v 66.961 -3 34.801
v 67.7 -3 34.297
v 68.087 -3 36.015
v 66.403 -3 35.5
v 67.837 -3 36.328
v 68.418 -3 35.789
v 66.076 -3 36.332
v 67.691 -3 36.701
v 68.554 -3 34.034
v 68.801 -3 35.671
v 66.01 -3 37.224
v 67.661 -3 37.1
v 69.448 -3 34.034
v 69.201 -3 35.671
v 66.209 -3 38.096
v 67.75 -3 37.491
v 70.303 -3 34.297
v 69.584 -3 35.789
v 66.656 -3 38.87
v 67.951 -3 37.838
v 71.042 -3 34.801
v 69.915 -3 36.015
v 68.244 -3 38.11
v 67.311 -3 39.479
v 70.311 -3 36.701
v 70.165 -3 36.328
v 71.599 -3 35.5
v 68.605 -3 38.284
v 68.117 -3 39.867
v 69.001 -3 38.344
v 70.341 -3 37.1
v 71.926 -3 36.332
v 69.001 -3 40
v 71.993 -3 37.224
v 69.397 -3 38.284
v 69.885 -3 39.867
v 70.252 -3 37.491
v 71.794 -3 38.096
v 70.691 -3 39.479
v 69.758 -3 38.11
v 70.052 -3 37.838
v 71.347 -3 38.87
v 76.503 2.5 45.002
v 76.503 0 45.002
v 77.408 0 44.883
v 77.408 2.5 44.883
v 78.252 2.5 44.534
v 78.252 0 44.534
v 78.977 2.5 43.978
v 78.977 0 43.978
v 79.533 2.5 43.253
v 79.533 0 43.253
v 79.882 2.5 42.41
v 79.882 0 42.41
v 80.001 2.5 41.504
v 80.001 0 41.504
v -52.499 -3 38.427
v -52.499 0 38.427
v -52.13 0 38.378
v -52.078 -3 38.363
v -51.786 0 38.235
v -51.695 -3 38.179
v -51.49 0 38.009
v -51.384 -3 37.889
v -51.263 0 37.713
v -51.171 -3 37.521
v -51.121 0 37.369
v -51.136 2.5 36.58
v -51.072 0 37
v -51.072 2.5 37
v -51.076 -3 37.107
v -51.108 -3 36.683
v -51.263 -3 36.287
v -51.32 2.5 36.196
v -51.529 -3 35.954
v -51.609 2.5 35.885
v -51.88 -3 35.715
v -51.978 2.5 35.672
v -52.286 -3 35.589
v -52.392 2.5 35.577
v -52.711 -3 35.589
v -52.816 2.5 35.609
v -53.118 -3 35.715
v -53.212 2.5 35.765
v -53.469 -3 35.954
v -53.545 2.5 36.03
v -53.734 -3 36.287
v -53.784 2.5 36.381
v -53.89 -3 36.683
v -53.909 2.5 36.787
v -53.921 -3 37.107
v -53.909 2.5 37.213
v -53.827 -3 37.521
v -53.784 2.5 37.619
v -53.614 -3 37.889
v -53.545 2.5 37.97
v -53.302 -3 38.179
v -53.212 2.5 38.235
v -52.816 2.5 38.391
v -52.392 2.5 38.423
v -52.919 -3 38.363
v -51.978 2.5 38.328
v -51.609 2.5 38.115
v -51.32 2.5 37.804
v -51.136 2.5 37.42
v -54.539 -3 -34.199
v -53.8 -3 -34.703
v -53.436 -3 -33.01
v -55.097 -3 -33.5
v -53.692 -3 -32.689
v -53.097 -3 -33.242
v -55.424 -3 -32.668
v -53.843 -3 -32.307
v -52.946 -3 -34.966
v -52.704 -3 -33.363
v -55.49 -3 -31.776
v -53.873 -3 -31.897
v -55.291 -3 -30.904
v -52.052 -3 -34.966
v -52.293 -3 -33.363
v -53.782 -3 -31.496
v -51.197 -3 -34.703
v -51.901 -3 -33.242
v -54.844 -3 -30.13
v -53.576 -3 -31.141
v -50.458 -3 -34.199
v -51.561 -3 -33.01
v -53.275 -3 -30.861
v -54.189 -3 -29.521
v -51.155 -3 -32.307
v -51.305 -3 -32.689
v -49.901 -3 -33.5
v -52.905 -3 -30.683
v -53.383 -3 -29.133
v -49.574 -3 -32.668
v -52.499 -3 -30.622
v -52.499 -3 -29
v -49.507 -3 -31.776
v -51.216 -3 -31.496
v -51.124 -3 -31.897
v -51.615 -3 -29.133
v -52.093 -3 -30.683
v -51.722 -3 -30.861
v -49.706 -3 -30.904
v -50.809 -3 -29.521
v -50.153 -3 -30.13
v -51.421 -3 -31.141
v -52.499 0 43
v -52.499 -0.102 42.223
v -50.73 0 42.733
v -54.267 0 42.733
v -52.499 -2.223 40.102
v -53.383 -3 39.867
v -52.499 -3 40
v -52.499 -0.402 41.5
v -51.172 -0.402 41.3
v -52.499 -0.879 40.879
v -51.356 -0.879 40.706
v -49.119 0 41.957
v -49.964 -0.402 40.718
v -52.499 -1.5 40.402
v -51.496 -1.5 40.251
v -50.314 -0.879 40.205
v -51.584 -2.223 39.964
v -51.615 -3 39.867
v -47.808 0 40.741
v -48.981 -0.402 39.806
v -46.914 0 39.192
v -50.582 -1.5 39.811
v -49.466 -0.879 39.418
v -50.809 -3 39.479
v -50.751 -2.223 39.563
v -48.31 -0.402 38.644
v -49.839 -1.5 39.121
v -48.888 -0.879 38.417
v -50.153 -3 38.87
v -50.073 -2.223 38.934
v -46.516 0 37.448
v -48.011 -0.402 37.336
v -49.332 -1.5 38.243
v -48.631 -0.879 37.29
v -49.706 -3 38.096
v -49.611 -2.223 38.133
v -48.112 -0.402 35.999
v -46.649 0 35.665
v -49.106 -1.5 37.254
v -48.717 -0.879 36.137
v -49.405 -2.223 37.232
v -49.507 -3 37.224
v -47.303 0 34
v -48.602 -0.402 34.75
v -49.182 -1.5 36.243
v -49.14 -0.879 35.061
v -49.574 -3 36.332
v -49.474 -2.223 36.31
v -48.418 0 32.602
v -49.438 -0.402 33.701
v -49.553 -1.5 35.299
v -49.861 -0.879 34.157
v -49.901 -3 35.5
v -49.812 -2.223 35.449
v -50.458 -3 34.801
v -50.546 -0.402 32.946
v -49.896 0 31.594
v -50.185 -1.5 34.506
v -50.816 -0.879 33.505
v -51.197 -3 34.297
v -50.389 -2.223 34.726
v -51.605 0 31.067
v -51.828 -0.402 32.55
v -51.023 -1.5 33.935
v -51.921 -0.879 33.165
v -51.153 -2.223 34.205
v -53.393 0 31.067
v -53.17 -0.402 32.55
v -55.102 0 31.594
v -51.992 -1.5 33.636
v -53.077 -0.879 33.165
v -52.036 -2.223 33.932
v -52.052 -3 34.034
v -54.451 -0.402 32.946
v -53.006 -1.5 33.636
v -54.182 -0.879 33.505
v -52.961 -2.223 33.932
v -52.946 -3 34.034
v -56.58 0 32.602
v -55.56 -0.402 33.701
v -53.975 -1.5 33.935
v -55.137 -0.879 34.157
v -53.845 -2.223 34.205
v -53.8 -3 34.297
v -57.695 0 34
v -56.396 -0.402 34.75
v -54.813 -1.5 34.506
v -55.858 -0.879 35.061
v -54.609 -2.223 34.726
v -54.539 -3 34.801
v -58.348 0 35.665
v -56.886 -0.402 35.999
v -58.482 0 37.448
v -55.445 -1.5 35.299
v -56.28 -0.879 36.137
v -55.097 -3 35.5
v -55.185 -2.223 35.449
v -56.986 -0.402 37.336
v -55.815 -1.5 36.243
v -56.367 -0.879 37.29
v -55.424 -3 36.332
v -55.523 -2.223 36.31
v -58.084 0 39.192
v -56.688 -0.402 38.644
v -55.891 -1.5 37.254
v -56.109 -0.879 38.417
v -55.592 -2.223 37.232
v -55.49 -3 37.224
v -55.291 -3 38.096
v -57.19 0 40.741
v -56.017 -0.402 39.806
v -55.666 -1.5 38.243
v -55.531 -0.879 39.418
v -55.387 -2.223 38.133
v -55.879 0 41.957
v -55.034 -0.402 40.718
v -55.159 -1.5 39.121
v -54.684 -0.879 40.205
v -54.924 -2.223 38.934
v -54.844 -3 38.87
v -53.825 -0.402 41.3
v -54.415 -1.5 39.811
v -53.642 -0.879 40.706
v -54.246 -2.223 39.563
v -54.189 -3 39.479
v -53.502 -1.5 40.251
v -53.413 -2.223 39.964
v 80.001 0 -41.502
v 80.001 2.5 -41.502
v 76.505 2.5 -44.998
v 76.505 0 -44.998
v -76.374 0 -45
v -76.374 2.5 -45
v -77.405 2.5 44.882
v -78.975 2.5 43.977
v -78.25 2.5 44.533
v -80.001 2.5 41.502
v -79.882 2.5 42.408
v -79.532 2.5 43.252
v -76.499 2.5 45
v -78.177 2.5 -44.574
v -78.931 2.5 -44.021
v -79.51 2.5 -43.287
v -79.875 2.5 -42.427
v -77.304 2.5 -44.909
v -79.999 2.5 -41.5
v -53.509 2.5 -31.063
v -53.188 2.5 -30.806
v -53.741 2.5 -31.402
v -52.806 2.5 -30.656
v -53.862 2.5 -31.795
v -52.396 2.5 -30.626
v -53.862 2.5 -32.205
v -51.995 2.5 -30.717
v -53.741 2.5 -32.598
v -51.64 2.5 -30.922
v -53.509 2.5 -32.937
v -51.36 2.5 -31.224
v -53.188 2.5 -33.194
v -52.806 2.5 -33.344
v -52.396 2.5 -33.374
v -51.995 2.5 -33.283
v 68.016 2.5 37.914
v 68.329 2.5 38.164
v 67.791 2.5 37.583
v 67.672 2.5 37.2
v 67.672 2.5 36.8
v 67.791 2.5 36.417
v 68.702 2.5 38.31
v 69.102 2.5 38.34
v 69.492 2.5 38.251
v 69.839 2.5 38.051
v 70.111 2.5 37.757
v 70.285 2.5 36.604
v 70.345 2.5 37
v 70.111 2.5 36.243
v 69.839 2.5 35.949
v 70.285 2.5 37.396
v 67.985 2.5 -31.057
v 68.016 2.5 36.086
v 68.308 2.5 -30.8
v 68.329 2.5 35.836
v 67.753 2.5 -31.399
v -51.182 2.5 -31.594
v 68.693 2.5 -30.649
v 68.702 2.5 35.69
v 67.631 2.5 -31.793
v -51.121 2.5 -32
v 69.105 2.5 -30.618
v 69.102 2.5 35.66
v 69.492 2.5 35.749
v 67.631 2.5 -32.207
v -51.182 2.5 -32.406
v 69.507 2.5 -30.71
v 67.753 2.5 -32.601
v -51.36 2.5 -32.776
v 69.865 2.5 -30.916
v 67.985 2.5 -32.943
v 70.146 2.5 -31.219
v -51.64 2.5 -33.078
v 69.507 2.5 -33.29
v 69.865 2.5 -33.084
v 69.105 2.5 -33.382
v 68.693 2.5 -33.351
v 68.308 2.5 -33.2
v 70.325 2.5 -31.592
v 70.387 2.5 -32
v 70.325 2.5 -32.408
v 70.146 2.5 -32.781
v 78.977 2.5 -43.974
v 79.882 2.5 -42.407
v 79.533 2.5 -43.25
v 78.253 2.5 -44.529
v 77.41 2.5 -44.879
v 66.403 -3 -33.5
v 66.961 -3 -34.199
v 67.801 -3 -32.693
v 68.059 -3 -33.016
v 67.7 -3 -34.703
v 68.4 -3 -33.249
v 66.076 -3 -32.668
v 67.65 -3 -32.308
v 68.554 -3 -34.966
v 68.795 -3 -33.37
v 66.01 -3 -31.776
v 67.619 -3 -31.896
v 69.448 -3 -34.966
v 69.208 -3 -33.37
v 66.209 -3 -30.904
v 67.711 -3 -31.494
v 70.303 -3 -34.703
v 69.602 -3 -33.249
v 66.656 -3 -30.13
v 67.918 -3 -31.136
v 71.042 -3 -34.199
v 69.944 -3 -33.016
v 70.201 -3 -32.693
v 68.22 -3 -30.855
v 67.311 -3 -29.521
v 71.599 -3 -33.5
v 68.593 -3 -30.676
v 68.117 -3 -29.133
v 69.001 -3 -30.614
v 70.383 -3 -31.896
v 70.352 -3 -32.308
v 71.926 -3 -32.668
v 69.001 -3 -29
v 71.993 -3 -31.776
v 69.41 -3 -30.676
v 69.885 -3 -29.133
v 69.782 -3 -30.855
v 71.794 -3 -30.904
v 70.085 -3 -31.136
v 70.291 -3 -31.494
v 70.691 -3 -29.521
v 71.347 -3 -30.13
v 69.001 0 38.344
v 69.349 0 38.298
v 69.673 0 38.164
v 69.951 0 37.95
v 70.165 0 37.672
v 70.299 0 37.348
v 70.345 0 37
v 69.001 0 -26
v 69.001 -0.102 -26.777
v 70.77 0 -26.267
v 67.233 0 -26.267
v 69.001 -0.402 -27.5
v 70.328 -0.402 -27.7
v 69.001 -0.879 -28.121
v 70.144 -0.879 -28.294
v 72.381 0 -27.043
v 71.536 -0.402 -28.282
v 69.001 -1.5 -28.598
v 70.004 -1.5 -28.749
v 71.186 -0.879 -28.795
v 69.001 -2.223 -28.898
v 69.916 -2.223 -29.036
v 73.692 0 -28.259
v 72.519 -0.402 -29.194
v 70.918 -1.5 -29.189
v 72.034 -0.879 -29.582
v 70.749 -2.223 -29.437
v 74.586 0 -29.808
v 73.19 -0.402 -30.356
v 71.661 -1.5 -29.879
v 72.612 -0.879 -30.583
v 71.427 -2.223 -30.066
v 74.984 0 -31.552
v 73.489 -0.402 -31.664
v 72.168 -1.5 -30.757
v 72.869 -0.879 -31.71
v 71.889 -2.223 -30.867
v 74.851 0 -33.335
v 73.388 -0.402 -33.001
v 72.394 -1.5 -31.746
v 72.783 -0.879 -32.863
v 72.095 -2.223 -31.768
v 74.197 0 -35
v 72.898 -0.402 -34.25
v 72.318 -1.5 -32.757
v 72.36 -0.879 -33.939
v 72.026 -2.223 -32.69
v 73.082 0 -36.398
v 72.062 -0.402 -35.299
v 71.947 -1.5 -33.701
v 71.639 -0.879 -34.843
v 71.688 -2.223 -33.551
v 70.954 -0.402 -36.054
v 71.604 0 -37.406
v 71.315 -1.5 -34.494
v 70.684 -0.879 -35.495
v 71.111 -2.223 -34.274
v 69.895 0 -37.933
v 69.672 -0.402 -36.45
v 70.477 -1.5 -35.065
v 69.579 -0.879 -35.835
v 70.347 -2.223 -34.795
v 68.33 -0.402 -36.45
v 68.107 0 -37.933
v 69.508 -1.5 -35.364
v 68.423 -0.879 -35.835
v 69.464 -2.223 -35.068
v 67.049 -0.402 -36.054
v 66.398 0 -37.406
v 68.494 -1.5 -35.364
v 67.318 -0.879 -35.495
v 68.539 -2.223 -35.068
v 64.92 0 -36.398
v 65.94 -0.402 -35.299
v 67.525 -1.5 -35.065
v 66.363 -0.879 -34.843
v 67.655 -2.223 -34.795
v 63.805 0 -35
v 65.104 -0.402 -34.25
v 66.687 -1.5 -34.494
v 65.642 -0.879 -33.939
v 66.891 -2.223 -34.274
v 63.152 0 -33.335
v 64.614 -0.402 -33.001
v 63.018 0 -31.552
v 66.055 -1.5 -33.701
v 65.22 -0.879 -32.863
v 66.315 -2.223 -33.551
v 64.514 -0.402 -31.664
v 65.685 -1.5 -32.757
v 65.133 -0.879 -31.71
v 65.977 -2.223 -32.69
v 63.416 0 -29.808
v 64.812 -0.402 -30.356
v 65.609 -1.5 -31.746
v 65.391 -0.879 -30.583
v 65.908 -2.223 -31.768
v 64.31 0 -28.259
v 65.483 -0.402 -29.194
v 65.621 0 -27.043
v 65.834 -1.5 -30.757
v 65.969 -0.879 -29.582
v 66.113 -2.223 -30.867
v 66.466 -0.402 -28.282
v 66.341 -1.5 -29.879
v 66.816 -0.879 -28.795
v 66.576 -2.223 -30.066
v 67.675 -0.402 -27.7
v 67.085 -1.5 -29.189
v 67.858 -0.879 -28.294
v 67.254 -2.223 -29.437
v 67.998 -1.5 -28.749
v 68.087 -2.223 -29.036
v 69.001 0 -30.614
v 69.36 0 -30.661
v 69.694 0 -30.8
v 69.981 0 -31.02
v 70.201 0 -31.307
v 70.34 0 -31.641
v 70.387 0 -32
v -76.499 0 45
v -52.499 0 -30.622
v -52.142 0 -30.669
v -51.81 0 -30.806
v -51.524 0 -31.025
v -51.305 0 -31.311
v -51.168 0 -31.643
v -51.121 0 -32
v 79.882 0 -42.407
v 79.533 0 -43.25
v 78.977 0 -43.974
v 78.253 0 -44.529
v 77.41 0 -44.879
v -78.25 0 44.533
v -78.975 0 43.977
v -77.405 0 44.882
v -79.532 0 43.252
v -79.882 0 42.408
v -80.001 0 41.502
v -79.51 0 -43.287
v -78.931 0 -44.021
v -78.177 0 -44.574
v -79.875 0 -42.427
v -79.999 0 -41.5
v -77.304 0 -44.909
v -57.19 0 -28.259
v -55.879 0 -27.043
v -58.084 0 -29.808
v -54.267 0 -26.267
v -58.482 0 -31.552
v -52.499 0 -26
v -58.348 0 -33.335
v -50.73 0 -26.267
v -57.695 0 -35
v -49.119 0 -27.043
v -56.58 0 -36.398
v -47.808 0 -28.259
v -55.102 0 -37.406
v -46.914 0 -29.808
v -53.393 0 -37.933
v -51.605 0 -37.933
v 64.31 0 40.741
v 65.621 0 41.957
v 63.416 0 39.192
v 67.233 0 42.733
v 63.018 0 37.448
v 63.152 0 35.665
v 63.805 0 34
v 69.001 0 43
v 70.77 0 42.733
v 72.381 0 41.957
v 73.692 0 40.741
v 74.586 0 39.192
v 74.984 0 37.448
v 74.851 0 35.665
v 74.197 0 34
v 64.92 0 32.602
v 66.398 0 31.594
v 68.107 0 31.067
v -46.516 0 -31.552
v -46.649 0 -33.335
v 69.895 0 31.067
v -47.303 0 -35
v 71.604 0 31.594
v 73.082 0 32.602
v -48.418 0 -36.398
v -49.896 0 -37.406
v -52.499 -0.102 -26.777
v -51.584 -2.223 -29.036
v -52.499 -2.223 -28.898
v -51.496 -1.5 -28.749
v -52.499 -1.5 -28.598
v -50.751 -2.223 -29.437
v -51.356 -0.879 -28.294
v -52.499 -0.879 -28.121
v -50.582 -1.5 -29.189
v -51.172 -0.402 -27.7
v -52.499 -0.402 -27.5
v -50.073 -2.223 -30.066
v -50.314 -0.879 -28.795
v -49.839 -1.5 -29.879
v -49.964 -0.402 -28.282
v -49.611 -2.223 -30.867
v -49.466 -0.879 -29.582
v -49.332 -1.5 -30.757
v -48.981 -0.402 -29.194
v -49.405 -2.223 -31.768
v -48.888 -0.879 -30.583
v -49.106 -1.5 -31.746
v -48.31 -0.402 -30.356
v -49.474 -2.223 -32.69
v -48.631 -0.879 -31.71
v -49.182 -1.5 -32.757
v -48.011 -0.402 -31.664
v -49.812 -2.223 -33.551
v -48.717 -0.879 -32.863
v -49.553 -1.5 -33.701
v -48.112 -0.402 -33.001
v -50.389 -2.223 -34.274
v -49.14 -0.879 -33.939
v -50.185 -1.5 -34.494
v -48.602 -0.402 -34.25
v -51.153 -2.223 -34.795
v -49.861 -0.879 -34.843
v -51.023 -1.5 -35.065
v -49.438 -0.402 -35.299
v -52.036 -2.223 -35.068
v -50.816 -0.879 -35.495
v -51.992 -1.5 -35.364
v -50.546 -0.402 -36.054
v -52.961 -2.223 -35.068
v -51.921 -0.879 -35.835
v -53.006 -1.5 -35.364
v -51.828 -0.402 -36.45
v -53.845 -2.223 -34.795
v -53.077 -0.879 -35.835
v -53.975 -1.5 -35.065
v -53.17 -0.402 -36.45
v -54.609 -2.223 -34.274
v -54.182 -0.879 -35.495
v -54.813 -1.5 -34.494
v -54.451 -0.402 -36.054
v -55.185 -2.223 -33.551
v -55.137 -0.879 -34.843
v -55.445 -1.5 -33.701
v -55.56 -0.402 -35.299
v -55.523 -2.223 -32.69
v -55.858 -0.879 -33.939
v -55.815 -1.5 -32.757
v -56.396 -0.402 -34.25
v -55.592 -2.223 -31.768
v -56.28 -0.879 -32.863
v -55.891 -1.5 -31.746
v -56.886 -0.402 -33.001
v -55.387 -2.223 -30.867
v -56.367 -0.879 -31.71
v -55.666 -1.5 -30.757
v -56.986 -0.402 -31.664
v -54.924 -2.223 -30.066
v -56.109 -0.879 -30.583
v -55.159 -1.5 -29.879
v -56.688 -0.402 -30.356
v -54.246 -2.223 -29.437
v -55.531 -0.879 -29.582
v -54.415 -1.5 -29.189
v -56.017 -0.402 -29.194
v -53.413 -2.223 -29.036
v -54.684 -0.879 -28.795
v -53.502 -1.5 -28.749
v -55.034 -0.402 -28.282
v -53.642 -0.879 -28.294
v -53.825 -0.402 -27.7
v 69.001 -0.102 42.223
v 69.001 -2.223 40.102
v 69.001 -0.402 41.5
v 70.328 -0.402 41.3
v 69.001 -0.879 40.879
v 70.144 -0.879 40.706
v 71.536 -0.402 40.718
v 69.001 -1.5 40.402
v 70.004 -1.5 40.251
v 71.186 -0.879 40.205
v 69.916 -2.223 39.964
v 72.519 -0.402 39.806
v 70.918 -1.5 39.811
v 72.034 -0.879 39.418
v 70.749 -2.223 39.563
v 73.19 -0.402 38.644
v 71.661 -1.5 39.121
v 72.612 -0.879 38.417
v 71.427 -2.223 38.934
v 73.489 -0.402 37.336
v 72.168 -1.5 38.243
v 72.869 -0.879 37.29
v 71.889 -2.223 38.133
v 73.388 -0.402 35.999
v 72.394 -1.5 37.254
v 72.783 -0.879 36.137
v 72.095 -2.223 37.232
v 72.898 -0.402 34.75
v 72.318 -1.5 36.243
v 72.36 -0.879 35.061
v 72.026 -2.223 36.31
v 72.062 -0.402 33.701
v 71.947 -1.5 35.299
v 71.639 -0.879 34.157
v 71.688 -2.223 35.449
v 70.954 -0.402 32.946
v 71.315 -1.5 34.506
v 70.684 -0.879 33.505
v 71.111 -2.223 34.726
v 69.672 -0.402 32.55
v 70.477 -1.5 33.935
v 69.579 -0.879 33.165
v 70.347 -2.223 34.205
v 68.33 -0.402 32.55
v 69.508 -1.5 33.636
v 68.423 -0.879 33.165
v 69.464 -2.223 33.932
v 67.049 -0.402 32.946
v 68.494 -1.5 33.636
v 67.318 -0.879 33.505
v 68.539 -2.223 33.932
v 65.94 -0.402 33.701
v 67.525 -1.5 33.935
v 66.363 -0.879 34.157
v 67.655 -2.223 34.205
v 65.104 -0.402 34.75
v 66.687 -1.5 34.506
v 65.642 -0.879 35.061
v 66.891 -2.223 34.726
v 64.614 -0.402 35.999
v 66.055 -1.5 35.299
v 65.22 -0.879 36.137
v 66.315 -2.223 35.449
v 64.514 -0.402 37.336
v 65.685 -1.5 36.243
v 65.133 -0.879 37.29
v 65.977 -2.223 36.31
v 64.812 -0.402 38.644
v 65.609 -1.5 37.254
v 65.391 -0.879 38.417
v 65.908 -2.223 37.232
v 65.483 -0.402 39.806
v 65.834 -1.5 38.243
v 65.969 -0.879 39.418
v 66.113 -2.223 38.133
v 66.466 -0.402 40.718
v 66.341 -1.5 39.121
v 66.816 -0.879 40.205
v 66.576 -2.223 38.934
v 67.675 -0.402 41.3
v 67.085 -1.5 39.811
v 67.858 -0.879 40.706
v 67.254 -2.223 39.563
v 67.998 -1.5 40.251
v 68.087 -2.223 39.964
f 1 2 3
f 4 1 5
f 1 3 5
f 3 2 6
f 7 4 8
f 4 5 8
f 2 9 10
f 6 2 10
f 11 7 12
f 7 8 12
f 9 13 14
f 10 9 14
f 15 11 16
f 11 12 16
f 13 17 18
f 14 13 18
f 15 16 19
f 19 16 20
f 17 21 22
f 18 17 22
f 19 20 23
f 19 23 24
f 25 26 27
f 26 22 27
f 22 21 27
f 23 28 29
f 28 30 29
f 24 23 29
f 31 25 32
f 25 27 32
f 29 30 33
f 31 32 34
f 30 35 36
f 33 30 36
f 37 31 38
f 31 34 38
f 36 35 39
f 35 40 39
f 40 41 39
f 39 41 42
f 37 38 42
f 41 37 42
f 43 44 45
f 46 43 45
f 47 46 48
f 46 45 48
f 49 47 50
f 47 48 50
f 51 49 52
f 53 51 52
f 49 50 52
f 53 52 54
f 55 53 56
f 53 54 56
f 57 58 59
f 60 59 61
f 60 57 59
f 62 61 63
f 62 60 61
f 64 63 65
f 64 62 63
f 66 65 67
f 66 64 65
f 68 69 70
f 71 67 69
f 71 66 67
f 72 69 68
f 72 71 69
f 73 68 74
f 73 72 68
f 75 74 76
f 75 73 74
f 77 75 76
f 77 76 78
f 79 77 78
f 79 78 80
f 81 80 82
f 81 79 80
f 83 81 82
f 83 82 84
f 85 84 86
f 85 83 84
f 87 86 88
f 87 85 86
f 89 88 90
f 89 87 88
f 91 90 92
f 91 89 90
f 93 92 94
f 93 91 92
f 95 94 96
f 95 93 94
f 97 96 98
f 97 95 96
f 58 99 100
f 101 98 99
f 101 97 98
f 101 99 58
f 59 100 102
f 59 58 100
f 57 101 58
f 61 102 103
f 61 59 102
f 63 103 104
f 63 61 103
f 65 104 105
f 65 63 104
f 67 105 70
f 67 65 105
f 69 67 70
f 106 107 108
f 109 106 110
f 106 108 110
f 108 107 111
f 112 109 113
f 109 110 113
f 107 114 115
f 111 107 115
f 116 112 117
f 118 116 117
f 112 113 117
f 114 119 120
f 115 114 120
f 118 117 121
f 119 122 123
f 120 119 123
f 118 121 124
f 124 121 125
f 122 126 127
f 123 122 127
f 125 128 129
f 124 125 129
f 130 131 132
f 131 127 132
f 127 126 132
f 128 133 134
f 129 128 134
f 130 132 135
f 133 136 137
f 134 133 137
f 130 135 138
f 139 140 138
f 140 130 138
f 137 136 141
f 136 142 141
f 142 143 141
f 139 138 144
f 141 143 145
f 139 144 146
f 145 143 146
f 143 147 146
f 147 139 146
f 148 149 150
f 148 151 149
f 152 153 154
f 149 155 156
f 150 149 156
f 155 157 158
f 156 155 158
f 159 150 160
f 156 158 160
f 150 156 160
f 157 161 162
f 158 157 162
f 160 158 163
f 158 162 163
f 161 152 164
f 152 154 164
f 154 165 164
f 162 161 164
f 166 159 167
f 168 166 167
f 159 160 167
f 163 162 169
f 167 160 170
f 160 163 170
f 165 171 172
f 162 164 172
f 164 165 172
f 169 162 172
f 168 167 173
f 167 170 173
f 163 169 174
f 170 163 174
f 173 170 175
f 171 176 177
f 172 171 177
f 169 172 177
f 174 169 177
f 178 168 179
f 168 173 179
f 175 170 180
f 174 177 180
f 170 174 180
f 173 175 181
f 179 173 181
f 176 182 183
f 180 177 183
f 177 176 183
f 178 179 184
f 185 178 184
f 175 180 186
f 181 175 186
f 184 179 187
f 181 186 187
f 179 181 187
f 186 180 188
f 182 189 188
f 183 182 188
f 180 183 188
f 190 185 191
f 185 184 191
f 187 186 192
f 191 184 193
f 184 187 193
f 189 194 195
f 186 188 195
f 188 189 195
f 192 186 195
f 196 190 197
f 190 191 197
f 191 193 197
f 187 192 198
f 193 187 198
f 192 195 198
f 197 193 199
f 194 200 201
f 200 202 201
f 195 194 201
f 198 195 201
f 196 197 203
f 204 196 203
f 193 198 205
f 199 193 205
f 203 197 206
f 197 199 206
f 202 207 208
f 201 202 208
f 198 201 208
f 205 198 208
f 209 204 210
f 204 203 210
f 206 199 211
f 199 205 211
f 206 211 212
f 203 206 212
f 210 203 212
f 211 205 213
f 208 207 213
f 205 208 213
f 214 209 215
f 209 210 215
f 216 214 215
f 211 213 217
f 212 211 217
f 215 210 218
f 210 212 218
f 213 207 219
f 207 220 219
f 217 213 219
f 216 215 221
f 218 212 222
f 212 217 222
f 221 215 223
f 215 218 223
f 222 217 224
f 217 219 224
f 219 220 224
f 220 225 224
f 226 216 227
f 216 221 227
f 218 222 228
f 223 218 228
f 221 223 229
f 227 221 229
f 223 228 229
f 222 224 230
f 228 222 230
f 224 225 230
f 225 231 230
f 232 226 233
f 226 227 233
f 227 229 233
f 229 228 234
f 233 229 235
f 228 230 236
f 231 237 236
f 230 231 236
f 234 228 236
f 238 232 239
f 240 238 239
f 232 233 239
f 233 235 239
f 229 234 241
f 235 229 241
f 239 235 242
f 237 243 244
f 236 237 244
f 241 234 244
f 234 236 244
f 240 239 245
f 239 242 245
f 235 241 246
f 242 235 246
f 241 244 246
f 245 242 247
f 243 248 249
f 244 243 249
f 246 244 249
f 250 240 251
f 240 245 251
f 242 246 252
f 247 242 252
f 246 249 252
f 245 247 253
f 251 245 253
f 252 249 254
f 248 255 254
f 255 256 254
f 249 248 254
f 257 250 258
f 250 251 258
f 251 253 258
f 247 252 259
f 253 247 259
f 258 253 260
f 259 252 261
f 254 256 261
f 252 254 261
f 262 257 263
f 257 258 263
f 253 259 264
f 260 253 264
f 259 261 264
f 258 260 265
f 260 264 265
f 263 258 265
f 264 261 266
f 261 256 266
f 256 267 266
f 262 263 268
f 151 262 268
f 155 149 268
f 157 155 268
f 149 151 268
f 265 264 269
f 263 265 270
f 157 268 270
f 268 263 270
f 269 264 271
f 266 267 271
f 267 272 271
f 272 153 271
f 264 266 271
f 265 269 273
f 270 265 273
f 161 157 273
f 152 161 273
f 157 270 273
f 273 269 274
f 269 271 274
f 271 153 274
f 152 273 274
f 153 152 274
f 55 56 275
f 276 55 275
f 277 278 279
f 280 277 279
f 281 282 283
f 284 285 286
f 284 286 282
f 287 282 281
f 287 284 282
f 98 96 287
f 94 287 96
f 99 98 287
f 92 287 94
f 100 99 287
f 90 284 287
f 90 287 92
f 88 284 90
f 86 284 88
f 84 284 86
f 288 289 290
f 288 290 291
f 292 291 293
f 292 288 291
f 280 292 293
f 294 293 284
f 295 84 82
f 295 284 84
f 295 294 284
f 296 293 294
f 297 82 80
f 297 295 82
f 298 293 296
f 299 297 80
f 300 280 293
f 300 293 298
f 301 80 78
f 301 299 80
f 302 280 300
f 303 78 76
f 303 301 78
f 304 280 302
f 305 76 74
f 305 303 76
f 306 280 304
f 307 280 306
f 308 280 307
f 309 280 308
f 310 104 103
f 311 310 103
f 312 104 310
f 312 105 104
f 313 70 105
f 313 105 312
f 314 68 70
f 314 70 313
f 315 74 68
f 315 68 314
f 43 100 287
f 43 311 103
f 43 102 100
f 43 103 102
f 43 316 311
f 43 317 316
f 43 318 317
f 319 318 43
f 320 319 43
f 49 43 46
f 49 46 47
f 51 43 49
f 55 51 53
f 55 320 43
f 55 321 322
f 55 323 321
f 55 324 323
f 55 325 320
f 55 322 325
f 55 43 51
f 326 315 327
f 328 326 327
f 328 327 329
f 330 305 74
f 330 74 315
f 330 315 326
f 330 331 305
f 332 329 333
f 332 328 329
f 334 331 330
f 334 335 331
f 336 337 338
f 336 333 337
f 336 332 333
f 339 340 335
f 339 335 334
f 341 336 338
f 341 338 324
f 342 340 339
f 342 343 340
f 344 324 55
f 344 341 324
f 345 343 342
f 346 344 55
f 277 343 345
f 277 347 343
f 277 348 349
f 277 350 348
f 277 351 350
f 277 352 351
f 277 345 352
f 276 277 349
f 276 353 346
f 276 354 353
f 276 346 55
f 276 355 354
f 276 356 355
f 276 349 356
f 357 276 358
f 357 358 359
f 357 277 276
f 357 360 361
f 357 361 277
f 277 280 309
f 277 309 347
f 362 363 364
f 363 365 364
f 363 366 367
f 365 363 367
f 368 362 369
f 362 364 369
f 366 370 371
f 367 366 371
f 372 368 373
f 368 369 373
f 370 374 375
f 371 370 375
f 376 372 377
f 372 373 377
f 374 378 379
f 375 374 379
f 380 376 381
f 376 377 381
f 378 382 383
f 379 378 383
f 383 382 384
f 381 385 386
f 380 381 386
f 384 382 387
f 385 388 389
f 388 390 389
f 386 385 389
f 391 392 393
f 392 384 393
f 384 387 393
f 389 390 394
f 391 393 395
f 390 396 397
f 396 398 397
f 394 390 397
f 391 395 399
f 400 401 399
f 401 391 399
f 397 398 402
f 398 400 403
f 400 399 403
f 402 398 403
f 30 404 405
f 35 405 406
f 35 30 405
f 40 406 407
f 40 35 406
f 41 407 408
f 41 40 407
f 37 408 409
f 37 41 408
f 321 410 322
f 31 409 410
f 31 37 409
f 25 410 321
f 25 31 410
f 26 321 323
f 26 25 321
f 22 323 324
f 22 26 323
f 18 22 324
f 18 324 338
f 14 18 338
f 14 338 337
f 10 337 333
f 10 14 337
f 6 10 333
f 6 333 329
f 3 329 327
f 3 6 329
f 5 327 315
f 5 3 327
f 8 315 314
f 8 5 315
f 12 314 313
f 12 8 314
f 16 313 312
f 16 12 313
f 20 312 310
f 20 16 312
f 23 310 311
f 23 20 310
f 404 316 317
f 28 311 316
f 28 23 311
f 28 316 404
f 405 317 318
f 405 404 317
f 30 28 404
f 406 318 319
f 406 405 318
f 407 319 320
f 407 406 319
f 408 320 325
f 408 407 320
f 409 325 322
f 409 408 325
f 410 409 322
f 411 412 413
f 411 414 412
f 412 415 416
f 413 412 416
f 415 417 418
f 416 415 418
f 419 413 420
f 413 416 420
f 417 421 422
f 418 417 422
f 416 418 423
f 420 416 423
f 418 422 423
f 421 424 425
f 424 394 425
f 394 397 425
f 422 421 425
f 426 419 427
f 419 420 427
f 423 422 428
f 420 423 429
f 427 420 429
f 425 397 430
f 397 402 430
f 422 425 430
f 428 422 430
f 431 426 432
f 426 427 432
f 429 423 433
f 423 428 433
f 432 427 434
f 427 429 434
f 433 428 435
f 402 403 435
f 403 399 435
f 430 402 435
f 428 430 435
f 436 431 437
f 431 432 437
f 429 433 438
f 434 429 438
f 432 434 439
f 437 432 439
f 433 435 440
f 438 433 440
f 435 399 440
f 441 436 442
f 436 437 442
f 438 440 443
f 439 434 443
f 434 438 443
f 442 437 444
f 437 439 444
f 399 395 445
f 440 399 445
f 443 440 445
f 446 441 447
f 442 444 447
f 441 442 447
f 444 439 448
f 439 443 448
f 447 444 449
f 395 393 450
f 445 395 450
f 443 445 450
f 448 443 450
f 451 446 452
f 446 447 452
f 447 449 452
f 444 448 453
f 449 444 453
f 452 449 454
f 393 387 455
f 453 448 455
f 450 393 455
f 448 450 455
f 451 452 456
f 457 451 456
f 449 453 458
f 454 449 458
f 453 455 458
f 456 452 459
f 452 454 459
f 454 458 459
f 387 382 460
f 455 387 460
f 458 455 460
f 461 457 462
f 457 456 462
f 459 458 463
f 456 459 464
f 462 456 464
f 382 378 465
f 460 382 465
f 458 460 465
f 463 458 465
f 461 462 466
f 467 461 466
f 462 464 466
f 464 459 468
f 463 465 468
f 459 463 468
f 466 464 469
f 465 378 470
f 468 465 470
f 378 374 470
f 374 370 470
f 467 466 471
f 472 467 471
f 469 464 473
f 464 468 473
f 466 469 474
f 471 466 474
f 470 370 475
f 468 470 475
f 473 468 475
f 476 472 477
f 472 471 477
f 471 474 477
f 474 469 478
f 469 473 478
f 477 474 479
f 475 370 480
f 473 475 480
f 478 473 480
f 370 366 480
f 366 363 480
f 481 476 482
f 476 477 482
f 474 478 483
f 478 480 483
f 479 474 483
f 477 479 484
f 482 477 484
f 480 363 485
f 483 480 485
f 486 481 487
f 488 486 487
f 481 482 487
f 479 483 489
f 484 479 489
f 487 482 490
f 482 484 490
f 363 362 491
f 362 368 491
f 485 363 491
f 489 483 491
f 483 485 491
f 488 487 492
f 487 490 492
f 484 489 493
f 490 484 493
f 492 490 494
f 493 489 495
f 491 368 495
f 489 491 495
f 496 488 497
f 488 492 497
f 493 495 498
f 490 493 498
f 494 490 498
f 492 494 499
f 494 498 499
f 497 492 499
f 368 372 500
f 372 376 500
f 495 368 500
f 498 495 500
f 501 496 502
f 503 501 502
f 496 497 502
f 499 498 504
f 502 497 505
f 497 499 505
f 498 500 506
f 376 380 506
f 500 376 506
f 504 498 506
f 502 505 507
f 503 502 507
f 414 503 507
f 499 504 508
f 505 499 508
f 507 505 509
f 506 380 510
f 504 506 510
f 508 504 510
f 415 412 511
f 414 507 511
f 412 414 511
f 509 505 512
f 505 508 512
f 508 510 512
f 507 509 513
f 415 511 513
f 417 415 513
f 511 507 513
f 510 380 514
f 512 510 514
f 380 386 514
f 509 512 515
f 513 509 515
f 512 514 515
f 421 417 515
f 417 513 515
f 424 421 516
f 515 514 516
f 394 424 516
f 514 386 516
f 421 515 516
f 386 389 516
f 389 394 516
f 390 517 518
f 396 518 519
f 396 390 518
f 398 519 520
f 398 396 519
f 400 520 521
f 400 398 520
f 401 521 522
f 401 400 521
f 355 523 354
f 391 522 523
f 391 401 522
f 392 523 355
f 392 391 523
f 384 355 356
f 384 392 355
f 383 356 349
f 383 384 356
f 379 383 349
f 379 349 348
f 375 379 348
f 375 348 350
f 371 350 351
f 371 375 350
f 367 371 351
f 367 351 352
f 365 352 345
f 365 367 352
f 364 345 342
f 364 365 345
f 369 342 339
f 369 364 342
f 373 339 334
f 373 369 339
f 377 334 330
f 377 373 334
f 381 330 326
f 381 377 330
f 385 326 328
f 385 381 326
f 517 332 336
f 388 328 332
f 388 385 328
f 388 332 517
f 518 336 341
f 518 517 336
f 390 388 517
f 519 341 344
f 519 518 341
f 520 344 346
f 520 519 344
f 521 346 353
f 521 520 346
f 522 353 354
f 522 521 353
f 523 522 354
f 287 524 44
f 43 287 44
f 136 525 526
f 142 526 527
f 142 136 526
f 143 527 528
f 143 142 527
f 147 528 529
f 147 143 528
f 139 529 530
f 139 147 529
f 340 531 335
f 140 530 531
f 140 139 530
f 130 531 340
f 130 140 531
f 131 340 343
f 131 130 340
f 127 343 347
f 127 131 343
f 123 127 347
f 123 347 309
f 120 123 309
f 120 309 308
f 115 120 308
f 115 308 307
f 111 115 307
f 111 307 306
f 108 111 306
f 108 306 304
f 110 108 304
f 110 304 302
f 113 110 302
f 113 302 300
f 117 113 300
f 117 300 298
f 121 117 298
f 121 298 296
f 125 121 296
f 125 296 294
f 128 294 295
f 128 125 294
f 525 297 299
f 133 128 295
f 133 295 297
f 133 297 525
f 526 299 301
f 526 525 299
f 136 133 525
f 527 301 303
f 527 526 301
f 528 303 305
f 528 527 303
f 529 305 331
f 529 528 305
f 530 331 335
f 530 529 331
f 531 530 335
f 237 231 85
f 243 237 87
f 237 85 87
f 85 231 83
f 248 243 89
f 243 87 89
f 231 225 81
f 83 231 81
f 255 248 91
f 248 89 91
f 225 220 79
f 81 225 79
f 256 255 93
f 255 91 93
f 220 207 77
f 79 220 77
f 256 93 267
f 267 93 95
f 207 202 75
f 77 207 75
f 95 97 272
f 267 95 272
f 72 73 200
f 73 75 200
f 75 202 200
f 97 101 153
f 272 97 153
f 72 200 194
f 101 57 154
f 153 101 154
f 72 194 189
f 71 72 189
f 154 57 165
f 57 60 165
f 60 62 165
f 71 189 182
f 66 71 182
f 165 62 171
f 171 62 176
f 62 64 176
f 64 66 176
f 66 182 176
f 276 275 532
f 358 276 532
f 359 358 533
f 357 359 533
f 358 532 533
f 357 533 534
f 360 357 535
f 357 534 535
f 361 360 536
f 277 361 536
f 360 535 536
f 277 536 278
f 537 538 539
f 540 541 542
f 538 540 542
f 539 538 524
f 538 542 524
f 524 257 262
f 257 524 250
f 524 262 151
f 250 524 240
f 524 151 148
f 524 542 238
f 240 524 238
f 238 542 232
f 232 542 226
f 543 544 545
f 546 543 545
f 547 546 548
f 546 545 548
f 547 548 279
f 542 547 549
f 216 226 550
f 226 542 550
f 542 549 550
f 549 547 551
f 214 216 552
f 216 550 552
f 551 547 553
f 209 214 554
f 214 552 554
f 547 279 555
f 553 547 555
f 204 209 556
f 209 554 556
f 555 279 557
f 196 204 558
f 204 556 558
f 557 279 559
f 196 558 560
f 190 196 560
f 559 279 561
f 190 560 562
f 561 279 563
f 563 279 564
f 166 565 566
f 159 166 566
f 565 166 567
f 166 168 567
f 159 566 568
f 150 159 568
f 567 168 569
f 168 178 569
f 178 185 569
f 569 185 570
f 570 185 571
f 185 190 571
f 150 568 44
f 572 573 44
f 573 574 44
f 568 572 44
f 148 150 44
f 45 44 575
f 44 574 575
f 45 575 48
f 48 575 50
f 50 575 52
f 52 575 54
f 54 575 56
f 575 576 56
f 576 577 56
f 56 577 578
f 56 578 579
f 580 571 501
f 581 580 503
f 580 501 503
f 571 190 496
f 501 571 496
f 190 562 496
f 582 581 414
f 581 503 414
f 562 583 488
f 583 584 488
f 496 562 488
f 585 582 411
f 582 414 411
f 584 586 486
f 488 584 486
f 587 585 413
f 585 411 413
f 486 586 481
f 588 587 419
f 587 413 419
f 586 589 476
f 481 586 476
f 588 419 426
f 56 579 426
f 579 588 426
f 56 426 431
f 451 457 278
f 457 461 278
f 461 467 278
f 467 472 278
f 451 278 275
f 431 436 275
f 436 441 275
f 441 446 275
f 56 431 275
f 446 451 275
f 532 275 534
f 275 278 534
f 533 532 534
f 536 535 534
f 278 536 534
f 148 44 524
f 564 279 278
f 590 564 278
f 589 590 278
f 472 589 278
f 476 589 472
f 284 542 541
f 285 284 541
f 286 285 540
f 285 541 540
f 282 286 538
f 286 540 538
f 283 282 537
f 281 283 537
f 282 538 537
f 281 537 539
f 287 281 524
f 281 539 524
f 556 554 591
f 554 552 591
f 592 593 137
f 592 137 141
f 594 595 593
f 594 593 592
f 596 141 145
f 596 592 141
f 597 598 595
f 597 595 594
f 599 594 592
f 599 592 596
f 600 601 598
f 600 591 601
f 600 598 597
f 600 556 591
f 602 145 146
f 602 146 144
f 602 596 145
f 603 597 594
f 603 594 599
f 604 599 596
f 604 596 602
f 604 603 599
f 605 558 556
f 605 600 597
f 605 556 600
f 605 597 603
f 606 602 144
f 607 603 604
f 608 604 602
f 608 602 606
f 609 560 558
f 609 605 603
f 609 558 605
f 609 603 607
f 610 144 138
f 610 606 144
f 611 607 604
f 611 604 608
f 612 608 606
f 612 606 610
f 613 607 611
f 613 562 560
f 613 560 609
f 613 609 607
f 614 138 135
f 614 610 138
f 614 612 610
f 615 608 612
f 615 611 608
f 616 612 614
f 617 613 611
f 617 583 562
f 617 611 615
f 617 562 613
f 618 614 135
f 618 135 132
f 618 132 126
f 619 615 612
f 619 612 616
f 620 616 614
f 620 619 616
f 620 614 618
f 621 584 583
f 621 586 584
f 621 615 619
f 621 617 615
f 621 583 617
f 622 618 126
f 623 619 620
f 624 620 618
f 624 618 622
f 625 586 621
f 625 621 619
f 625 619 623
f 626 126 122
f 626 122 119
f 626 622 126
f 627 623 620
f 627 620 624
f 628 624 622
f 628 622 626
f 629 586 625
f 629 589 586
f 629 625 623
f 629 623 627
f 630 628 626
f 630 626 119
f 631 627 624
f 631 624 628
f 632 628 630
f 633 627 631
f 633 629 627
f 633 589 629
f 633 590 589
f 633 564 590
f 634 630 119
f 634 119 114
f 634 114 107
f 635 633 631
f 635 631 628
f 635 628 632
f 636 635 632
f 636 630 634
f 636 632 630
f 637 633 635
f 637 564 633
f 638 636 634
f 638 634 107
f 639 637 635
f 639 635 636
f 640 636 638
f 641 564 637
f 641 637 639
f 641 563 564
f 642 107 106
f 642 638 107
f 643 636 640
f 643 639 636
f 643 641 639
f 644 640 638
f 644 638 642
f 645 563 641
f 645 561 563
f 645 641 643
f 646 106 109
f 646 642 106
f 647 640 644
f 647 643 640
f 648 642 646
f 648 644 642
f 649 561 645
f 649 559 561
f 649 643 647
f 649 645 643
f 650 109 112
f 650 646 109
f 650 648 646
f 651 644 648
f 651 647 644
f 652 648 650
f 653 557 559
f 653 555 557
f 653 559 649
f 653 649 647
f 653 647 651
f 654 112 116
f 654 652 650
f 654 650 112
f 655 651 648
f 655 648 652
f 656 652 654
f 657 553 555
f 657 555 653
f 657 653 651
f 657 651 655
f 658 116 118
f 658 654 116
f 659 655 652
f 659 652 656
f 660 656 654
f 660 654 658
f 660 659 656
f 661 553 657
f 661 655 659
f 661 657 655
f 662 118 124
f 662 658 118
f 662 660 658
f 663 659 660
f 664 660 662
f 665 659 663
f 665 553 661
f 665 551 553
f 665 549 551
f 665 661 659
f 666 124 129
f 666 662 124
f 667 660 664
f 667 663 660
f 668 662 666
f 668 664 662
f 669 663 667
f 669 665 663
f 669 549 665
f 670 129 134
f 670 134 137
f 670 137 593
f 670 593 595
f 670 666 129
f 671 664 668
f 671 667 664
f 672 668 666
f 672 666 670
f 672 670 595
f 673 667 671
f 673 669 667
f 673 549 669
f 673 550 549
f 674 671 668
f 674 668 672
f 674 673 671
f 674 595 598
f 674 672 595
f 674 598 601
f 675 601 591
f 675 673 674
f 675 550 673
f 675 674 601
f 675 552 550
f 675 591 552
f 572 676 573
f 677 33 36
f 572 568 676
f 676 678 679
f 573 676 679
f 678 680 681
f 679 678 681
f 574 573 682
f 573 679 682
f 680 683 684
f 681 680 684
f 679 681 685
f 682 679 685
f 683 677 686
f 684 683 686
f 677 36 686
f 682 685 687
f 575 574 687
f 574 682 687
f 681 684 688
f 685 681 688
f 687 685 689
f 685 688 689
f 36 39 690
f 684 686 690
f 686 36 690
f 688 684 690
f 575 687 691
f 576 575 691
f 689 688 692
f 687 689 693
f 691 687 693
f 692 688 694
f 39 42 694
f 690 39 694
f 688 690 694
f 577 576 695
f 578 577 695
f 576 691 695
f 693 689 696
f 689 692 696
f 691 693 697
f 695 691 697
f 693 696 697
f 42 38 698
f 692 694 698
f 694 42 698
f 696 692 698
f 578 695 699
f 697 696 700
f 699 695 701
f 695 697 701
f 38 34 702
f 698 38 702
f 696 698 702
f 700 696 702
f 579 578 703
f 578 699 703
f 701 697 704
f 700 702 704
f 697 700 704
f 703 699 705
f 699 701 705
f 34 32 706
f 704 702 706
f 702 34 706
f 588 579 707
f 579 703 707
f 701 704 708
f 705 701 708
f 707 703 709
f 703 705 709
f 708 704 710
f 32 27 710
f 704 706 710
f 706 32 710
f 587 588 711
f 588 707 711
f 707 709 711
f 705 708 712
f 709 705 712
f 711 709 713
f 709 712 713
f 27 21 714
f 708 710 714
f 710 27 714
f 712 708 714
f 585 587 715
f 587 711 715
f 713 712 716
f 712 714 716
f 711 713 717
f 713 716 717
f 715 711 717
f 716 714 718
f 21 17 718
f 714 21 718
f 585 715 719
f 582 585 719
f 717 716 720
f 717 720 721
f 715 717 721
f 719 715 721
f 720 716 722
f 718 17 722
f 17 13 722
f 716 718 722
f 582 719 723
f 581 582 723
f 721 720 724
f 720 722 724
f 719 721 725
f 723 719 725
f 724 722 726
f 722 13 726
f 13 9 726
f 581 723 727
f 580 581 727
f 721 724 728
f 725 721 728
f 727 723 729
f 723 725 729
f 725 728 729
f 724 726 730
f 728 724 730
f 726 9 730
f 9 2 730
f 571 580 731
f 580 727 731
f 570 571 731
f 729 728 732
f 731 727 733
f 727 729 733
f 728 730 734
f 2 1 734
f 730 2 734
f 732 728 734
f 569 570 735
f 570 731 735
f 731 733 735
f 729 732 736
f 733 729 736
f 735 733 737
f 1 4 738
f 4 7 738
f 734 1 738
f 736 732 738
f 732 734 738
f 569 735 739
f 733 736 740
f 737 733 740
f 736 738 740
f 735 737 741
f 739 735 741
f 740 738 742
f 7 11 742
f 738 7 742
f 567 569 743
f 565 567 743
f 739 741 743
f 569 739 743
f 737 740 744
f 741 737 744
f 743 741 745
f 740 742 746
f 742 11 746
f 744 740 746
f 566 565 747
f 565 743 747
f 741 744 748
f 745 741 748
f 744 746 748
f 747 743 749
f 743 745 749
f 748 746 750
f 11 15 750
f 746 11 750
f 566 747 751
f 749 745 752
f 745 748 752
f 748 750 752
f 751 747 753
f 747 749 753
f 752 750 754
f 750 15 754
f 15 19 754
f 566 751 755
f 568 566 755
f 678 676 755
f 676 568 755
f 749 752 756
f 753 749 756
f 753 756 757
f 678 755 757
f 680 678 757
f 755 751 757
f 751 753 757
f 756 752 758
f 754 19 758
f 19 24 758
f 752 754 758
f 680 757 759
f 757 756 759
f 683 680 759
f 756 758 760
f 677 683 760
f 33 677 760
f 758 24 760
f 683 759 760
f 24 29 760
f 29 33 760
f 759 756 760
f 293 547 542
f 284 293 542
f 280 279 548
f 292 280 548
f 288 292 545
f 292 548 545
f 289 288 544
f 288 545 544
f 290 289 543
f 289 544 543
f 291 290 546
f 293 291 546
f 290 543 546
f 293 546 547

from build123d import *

# Parameters (mm, degrees)
BOSS_EXTRUDE1_OUTLINE_R   = 1.426531271
BOSS_EXTRUDE1_OUTLINE_R_2 = 1.343679746
BOSS_EXTRUDE1_OUTLINE_R_3 = 1.378285228
BOSS_EXTRUDE1_OUTLINE_R_4 = 1.385856135
BOSS_EXTRUDE1_DEPTH       = 2.5
BOSS_EXTRUDE2_START       = -3
SKETCH1_3_R               = 3
SKETCH1_3_R_2             = 1.378285228
SKETCH1_3_R_3             = 1.385856135
SKETCH1_3_R_4             = 1.343679746
SKETCH1_3_R_5             = 1.426531271
BOSS_EXTRUDE2_DEPTH       = 3
FILLET1_R                 = 3


# Read off the part's stored shape, not the designer's step: Boss-Extrude1
with BuildPart() as part:
    # Boss-Extrude1 outline → Boss-Extrude1 (new body)
    with BuildSketch(Plane(origin=(0, 0, 0), x_dir=(1, 0, 0), z_dir=(0, 1, 0))):
        with BuildLine():
            Line((-76.498848721, -45), (76.503120692, -45.002303107))
            ThreePointArc((76.503120692, -45.002303107), (78.976602231, -43.977753507), (80.001151831, -41.504271968))
            Line((80.001151831, -41.504271968), (80.001151831, 41.501969416))
            ThreePointArc((80.001151831, 41.501969416), (78.977276633, 43.973822805), (76.505423244, 44.997698002))
            Line((76.505423244, 44.997698002), (-76.373794917, 44.999998119))
            ThreePointArc((-76.373794917, 44.999998119), (-78.930513463, 44.02078083), (-79.998848724, 41.5))
            Line((-79.998848724, 41.5), (-80.001153885, -41.501969416))
            ThreePointArc((-80.001153885, -41.501969416), (-78.975092852, -43.976962316), (-76.498848721, -45))
        make_face()
        with Locations((-52.498848724, -37)):
            Circle(BOSS_EXTRUDE1_OUTLINE_R, mode=Mode.SUBTRACT)
        with Locations((69.001151276, -37)):
            Circle(BOSS_EXTRUDE1_OUTLINE_R_2, mode=Mode.SUBTRACT)
        with Locations((-52.498848724, 32)):
            Circle(BOSS_EXTRUDE1_OUTLINE_R_3, mode=Mode.SUBTRACT)
        with Locations((69.001151276, 32)):
            Circle(BOSS_EXTRUDE1_OUTLINE_R_4, mode=Mode.SUBTRACT)
    extrude(amount=BOSS_EXTRUDE1_DEPTH)

    # Sketch1<3> → Boss-Extrude2 (add)
    # profile 1 of 4: a face of its own
    with BuildSketch(Plane(origin=(0, 0, 0), x_dir=(1, 0, 0), z_dir=(0, 1, 0)).offset(BOSS_EXTRUDE2_START)):
        with Locations(Location((-52.498848724, 32, 0), (0, 0, 270))):
            Circle(SKETCH1_3_R)
        with Locations(Location((-52.498848724, 32, 0), (0, 0, 270))):
            Circle(SKETCH1_3_R_2, mode=Mode.SUBTRACT)
    # profile 2 of 4: a face of its own
    with BuildSketch(Plane(origin=(0, 0, 0), x_dir=(1, 0, 0), z_dir=(0, 1, 0)).offset(BOSS_EXTRUDE2_START)):
        with Locations(Location((69.001151276, 32, 0), (0, 0, 270))):
            Circle(SKETCH1_3_R)
        with Locations(Location((69.001151276, 32, 0), (0, 0, 270))):
            Circle(SKETCH1_3_R_3, mode=Mode.SUBTRACT)
    # profile 3 of 4: a face of its own
    with BuildSketch(Plane(origin=(0, 0, 0), x_dir=(1, 0, 0), z_dir=(0, 1, 0)).offset(BOSS_EXTRUDE2_START)):
        with Locations(Location((69.001151276, -37, 0), (0, 0, 270))):
            Circle(SKETCH1_3_R)
        with Locations(Location((69.001151276, -37, 0), (0, 0, 270))):
            Circle(SKETCH1_3_R_4, mode=Mode.SUBTRACT)
    # profile 4 of 4: a face of its own
    with BuildSketch(Plane(origin=(0, 0, 0), x_dir=(1, 0, 0), z_dir=(0, 1, 0)).offset(BOSS_EXTRUDE2_START)):
        with Locations(Location((-52.498848724, -37, 0), (0, 0, 270))):
            Circle(SKETCH1_3_R)
        with Locations(Location((-52.498848724, -37, 0), (0, 0, 270))):
            Circle(SKETCH1_3_R_5, mode=Mode.SUBTRACT)
    extrude(amount=BOSS_EXTRUDE2_DEPTH)

    # Fillet1
    fillet1_edges = [part.edges().sort_by_distance(p)[0] for p in [
        (-52.498848724, 0, -35),
        (69.001151276, 0, -35),
        (69.001151276, 0, 34),
        (-52.498848724, 0, 34),
    ]]
    fillet(fillet1_edges, radius=FILLET1_R - 0.0001)  # a hair under: the kernel refuses the full size


solid = part.part
